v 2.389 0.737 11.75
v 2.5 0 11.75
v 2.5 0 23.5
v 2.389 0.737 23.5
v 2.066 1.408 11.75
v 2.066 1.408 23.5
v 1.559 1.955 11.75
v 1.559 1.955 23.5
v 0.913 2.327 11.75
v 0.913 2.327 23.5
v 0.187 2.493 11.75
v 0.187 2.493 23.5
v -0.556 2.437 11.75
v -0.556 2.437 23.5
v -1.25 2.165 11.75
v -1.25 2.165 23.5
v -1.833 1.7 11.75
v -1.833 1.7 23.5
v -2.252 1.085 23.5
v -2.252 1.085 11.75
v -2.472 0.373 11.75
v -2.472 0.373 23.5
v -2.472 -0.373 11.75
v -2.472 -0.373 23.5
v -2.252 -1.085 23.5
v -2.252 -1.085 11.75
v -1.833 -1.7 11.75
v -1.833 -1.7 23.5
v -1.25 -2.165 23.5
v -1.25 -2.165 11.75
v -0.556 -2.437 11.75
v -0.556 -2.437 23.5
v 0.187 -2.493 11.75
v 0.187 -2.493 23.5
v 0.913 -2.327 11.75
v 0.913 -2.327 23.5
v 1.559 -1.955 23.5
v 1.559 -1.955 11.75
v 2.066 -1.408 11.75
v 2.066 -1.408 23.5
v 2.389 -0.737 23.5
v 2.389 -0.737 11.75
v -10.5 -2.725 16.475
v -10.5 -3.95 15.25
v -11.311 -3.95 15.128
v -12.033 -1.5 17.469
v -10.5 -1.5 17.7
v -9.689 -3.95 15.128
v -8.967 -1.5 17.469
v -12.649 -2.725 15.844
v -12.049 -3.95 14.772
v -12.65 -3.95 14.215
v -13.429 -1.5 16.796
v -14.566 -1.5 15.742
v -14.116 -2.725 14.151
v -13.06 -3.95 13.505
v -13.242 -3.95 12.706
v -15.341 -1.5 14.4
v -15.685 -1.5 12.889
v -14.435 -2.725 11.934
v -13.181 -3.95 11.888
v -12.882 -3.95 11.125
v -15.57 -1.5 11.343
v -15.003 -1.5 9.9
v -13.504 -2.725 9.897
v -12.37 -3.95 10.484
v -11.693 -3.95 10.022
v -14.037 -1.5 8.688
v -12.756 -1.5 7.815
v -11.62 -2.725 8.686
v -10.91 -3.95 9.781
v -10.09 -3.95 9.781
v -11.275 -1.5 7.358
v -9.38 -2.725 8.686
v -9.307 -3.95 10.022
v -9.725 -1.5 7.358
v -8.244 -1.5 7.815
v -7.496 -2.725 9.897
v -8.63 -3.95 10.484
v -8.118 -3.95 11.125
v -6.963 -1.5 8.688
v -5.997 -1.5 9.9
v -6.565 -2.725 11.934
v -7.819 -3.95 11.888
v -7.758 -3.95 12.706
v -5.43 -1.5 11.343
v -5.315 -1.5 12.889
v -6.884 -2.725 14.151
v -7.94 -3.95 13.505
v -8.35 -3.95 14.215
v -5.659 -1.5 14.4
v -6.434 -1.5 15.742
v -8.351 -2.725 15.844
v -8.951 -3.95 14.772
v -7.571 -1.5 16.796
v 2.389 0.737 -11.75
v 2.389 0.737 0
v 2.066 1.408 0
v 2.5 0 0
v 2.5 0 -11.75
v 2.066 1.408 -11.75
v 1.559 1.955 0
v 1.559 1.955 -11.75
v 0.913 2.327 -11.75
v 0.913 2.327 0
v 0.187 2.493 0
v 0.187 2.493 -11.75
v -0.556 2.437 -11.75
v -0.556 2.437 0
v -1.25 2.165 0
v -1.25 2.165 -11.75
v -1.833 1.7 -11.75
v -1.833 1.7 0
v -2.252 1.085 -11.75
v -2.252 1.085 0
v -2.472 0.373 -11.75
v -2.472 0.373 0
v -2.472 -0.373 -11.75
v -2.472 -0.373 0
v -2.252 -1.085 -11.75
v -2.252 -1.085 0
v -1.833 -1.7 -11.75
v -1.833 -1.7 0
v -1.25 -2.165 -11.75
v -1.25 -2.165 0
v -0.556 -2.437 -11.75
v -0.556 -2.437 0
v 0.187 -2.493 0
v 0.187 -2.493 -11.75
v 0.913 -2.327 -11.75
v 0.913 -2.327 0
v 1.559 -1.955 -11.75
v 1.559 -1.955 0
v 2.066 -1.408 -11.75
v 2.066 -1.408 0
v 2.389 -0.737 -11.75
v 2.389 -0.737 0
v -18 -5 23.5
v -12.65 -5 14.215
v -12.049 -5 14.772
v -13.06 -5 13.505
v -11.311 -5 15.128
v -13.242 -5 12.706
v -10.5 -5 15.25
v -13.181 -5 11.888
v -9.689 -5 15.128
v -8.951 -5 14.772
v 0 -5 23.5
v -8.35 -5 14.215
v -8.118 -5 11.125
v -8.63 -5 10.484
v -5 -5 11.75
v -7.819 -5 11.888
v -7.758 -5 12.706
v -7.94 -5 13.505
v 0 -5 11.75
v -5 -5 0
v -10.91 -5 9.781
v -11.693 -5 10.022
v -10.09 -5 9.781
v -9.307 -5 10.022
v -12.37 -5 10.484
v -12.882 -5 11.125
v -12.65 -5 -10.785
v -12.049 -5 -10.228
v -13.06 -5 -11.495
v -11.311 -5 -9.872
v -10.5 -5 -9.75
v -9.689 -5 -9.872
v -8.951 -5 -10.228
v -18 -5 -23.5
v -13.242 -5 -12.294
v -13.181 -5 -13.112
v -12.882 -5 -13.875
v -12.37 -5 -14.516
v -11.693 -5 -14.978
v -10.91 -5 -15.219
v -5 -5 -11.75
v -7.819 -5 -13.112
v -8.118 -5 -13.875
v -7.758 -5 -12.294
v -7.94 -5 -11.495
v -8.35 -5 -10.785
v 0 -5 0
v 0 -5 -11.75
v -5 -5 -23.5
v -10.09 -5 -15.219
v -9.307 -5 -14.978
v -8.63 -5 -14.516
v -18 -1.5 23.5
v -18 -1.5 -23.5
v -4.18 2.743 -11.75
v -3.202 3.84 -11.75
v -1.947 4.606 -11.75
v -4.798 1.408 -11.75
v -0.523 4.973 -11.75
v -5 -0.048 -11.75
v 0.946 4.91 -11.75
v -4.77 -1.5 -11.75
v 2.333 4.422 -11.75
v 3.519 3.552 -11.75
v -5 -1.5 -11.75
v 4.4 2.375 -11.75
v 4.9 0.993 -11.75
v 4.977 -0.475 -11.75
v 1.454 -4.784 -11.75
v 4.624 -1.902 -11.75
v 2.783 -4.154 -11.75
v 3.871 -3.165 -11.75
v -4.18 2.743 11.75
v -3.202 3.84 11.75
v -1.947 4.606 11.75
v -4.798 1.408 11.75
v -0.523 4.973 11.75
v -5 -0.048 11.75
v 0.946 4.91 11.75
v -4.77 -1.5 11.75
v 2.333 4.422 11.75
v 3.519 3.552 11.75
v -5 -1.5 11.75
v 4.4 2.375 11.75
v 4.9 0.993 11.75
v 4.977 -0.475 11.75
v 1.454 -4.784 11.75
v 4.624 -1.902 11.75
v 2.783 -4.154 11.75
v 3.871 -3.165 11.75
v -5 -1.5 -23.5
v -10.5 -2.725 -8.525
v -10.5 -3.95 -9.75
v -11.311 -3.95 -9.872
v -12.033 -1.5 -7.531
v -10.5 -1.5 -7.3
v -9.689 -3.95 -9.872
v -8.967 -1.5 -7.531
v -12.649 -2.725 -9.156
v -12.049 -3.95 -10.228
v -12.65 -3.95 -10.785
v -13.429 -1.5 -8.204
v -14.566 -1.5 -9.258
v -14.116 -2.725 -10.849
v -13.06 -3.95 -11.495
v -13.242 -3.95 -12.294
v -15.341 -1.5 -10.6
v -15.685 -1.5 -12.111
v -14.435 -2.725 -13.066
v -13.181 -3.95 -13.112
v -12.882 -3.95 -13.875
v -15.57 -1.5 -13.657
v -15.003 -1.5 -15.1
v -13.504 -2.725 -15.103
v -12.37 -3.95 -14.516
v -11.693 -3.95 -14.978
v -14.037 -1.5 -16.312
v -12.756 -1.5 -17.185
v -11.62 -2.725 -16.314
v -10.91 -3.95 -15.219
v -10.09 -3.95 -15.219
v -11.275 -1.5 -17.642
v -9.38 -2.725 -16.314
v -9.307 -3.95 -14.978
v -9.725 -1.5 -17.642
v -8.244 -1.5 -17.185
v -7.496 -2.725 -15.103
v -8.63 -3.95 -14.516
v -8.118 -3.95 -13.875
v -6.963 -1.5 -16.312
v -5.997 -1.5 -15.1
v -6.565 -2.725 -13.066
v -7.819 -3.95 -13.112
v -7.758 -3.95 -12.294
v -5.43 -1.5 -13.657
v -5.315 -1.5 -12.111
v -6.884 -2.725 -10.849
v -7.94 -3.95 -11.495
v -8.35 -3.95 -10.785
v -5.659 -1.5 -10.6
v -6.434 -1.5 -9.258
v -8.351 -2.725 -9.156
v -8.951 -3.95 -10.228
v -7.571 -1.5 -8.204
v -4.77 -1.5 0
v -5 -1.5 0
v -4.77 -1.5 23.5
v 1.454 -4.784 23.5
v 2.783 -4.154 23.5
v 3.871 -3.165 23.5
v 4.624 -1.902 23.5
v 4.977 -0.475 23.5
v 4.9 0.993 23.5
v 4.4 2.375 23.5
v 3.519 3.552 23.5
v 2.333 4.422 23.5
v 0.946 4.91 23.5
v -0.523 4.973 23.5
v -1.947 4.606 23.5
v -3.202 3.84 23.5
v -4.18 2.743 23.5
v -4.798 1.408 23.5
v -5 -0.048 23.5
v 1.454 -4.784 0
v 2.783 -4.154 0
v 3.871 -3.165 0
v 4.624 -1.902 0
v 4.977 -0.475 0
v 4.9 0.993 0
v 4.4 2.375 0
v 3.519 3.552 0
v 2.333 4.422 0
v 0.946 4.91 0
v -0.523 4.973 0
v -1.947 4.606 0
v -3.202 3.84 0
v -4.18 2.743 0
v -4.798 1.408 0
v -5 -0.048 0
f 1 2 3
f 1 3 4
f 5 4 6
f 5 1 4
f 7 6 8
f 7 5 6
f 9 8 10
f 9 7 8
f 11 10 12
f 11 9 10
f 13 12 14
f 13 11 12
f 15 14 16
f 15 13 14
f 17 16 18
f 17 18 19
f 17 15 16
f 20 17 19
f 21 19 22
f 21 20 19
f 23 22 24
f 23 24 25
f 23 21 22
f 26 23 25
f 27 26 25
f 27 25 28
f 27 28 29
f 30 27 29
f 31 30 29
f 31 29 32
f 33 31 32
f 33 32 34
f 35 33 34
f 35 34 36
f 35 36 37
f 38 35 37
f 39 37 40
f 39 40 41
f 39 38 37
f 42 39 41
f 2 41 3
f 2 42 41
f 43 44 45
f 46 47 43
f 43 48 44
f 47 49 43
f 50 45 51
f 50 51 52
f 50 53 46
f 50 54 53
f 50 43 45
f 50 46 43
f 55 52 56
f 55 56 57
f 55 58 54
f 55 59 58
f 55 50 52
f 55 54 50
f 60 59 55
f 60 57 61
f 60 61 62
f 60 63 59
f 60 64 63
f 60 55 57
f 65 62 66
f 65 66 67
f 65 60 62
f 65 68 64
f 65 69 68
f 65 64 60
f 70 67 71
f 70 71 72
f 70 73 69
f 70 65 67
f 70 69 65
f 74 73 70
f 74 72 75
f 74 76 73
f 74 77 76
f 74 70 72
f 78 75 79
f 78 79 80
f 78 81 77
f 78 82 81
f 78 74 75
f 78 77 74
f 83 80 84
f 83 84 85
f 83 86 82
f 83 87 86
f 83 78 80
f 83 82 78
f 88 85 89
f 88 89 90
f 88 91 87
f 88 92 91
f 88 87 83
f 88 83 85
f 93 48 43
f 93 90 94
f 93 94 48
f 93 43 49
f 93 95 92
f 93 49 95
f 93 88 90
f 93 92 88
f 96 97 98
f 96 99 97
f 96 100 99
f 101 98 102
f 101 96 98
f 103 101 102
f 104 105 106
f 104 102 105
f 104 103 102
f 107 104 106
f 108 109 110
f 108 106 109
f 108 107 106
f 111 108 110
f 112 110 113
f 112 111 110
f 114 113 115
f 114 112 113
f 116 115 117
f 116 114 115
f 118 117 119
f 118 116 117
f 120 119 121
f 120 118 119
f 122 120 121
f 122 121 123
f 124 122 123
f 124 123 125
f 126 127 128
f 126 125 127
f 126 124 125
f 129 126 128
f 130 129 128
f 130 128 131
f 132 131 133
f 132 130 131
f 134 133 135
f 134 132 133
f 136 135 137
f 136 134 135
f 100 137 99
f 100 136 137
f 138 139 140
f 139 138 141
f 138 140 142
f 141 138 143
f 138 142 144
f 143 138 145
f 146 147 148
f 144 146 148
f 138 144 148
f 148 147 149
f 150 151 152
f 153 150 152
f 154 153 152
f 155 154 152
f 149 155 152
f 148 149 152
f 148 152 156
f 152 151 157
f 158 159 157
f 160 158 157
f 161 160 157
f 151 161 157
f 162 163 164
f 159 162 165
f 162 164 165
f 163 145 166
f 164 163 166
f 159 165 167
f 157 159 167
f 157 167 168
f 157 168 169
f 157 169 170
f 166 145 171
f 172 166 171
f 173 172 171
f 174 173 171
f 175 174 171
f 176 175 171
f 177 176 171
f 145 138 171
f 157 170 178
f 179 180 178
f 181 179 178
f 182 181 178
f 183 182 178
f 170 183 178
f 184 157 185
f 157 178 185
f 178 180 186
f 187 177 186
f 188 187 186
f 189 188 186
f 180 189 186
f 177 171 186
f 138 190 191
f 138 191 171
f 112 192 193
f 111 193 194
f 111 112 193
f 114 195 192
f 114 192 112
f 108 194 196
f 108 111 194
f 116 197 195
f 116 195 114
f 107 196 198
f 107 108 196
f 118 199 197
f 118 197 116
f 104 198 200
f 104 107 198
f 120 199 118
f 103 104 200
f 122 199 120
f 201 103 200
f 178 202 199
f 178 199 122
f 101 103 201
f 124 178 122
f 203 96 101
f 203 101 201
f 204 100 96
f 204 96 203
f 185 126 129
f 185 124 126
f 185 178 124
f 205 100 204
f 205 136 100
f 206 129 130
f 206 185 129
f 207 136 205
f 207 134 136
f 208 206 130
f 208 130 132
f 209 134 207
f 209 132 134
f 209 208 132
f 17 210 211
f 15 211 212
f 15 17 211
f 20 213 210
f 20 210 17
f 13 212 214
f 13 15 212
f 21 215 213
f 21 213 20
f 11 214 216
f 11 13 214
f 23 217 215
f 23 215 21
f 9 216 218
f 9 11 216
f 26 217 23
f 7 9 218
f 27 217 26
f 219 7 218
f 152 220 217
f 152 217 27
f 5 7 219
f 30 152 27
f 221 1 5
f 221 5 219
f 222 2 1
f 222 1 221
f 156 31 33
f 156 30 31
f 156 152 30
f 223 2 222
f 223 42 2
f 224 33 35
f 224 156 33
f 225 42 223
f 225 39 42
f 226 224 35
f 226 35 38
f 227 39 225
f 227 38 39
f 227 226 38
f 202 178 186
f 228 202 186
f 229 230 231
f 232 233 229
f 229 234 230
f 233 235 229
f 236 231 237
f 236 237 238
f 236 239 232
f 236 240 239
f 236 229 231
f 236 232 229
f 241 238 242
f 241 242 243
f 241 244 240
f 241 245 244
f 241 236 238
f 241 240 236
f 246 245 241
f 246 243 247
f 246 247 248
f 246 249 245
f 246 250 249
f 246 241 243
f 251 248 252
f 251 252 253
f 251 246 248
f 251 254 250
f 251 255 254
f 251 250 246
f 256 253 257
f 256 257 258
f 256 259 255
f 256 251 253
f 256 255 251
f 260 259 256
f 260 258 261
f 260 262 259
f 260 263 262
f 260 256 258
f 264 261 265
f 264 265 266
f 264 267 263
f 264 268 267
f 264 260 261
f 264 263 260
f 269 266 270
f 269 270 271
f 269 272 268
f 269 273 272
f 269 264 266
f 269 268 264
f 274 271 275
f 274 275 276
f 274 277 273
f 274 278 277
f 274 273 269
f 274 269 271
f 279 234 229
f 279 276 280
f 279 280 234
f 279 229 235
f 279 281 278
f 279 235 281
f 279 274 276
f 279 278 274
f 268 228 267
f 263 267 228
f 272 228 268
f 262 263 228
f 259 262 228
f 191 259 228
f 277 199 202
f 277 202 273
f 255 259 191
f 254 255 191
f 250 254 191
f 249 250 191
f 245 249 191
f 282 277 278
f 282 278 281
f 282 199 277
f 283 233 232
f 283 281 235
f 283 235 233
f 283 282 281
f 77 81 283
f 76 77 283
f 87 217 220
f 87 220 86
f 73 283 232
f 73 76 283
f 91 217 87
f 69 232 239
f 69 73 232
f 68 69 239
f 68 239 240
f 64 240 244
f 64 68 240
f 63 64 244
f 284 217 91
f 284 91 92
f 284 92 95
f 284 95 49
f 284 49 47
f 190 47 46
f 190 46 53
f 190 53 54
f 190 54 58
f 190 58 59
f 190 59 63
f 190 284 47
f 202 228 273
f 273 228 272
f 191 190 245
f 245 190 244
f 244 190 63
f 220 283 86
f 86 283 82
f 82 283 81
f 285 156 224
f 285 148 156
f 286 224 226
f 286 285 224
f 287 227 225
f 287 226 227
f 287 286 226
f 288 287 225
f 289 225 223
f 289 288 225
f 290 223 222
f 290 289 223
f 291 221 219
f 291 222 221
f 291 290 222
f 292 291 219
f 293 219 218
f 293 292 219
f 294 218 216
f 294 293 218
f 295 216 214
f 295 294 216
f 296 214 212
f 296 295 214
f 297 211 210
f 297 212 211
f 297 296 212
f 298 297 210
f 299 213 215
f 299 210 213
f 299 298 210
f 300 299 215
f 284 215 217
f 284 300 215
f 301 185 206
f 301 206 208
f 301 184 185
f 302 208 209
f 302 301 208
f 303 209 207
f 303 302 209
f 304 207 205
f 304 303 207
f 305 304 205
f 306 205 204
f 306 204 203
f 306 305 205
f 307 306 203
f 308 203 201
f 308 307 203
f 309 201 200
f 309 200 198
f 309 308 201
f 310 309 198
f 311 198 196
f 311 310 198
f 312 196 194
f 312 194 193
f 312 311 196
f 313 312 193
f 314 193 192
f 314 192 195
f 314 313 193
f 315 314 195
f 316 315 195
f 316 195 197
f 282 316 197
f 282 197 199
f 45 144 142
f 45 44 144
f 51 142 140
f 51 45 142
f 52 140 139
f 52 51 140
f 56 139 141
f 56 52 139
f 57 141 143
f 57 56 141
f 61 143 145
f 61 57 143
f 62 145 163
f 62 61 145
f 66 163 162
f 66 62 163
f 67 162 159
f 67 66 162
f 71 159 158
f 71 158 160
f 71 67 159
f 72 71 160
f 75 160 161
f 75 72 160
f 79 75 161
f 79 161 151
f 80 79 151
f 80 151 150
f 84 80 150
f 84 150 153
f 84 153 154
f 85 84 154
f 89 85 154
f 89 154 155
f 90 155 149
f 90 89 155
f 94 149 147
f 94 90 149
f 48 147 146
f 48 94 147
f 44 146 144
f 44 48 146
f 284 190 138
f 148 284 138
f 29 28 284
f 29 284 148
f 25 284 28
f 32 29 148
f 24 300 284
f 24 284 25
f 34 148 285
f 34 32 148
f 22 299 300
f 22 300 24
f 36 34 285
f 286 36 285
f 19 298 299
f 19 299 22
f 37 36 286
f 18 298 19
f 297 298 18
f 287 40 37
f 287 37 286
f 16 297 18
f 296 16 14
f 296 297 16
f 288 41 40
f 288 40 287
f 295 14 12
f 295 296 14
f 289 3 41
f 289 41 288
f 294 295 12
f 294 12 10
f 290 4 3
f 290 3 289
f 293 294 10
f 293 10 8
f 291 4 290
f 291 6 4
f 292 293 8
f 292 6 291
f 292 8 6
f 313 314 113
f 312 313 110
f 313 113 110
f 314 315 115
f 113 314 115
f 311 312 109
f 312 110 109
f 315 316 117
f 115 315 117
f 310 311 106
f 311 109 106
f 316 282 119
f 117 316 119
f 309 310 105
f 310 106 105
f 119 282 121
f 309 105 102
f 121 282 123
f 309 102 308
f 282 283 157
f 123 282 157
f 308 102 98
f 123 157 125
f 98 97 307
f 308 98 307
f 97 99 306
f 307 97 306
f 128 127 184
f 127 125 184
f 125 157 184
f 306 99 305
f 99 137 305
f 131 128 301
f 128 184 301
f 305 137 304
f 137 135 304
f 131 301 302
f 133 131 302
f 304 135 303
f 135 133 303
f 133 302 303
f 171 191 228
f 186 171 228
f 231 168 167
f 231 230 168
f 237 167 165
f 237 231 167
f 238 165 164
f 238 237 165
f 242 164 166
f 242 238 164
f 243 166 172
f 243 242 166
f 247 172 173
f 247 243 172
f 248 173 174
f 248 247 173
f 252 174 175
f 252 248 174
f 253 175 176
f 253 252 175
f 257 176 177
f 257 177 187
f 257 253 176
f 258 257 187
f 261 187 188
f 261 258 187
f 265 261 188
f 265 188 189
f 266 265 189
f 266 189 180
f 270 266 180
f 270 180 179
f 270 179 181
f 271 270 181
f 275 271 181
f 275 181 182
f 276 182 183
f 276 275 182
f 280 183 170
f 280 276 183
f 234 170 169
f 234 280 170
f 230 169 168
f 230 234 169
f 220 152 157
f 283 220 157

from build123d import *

# Parameters (mm, degrees)
SKETCH1_R                                    = 5
SKETCH1_R_2                                  = 2.5
BOSS_EXTRUDE1_DEPTH                          = 23.5
CSK_FOR_M5_COUNTERSUNK_FLAT_HEAD_SCR_2_COUNT = 2
CSK_FOR_M5_COUNTERSUNK_FLAT_HEAD_SCR_2_PITCH = 25
CUT_EXTRUDE1_DEPTH                           = 31.020826105
CUT_EXTRUDE1_DEPTH_BACK                      = 31.020826105
SKETCH4_W                                    = 10
SKETCH4_H                                    = 11.75


with BuildPart() as part:
    # Sketch1 → Boss-Extrude1 (new, symmetric)
    # profile 1 of 2: a face of its own
    with BuildSketch(Plane.XY):
        with BuildLine():
            Line((-18, -5), (0, -5))
            ThreePointArc((0, -5), (-2.958039892, -4.031128874), (-4.769696007, -1.5))
            Line((-4.769696007, -1.5), (-18, -1.5))
            Line((-18, -1.5), (-18, -5))
        make_face()
    # profile 2 of 2: a face of its own
    with BuildSketch(Plane.XY):
        Circle(SKETCH1_R)
        Circle(SKETCH1_R_2, mode=Mode.SUBTRACT)
    extrude(amount=BOSS_EXTRUDE1_DEPTH, both=True)

    # Sketch3 → CSK for M5 Countersunk Flat Head Screw1 (revolve, cut)
    with BuildSketch(Plane(origin=(-10.5, -1.5, -12.5), x_dir=(0, 0, 1), z_dir=(1, 0, 0))):
        Polygon((0, 0), (0, 3.5), (2.75, 3.5), (2.75, 2.45), (5.2, 0), align=None)
    csk_for_m5_countersunk_flat_head_screw1 = revolve(axis=Axis((-10.5, 4.85, -12.5), (0, -1, 0)), mode=Mode.SUBTRACT)

    # CSK for M5 Countersunk Flat Head Scr 2: CSK for M5 Countersunk Flat Head Screw1 ×2
    with Locations(*[(0, 0, i * CSK_FOR_M5_COUNTERSUNK_FLAT_HEAD_SCR_2_PITCH) for i in range(1, CSK_FOR_M5_COUNTERSUNK_FLAT_HEAD_SCR_2_COUNT)]):
        add(csk_for_m5_countersunk_flat_head_screw1, mode=Mode.SUBTRACT)

    # Sketch4 → Cut-Extrude1 (cut, two sides: drawn at the far end of the back side and taken through both)
    with BuildSketch(Plane(origin=(0, 0, 0), x_dir=(1, 0, 0), z_dir=(0, 1, 0)).offset(-CUT_EXTRUDE1_DEPTH_BACK)):
        with Locations((0, 17.625)):
            Rectangle(SKETCH4_W, SKETCH4_H)
        with Locations((0, -5.875)):
            Rectangle(SKETCH4_W, SKETCH4_H)
    extrude(amount=CUT_EXTRUDE1_DEPTH + CUT_EXTRUDE1_DEPTH_BACK, mode=Mode.SUBTRACT)


solid = part.part
